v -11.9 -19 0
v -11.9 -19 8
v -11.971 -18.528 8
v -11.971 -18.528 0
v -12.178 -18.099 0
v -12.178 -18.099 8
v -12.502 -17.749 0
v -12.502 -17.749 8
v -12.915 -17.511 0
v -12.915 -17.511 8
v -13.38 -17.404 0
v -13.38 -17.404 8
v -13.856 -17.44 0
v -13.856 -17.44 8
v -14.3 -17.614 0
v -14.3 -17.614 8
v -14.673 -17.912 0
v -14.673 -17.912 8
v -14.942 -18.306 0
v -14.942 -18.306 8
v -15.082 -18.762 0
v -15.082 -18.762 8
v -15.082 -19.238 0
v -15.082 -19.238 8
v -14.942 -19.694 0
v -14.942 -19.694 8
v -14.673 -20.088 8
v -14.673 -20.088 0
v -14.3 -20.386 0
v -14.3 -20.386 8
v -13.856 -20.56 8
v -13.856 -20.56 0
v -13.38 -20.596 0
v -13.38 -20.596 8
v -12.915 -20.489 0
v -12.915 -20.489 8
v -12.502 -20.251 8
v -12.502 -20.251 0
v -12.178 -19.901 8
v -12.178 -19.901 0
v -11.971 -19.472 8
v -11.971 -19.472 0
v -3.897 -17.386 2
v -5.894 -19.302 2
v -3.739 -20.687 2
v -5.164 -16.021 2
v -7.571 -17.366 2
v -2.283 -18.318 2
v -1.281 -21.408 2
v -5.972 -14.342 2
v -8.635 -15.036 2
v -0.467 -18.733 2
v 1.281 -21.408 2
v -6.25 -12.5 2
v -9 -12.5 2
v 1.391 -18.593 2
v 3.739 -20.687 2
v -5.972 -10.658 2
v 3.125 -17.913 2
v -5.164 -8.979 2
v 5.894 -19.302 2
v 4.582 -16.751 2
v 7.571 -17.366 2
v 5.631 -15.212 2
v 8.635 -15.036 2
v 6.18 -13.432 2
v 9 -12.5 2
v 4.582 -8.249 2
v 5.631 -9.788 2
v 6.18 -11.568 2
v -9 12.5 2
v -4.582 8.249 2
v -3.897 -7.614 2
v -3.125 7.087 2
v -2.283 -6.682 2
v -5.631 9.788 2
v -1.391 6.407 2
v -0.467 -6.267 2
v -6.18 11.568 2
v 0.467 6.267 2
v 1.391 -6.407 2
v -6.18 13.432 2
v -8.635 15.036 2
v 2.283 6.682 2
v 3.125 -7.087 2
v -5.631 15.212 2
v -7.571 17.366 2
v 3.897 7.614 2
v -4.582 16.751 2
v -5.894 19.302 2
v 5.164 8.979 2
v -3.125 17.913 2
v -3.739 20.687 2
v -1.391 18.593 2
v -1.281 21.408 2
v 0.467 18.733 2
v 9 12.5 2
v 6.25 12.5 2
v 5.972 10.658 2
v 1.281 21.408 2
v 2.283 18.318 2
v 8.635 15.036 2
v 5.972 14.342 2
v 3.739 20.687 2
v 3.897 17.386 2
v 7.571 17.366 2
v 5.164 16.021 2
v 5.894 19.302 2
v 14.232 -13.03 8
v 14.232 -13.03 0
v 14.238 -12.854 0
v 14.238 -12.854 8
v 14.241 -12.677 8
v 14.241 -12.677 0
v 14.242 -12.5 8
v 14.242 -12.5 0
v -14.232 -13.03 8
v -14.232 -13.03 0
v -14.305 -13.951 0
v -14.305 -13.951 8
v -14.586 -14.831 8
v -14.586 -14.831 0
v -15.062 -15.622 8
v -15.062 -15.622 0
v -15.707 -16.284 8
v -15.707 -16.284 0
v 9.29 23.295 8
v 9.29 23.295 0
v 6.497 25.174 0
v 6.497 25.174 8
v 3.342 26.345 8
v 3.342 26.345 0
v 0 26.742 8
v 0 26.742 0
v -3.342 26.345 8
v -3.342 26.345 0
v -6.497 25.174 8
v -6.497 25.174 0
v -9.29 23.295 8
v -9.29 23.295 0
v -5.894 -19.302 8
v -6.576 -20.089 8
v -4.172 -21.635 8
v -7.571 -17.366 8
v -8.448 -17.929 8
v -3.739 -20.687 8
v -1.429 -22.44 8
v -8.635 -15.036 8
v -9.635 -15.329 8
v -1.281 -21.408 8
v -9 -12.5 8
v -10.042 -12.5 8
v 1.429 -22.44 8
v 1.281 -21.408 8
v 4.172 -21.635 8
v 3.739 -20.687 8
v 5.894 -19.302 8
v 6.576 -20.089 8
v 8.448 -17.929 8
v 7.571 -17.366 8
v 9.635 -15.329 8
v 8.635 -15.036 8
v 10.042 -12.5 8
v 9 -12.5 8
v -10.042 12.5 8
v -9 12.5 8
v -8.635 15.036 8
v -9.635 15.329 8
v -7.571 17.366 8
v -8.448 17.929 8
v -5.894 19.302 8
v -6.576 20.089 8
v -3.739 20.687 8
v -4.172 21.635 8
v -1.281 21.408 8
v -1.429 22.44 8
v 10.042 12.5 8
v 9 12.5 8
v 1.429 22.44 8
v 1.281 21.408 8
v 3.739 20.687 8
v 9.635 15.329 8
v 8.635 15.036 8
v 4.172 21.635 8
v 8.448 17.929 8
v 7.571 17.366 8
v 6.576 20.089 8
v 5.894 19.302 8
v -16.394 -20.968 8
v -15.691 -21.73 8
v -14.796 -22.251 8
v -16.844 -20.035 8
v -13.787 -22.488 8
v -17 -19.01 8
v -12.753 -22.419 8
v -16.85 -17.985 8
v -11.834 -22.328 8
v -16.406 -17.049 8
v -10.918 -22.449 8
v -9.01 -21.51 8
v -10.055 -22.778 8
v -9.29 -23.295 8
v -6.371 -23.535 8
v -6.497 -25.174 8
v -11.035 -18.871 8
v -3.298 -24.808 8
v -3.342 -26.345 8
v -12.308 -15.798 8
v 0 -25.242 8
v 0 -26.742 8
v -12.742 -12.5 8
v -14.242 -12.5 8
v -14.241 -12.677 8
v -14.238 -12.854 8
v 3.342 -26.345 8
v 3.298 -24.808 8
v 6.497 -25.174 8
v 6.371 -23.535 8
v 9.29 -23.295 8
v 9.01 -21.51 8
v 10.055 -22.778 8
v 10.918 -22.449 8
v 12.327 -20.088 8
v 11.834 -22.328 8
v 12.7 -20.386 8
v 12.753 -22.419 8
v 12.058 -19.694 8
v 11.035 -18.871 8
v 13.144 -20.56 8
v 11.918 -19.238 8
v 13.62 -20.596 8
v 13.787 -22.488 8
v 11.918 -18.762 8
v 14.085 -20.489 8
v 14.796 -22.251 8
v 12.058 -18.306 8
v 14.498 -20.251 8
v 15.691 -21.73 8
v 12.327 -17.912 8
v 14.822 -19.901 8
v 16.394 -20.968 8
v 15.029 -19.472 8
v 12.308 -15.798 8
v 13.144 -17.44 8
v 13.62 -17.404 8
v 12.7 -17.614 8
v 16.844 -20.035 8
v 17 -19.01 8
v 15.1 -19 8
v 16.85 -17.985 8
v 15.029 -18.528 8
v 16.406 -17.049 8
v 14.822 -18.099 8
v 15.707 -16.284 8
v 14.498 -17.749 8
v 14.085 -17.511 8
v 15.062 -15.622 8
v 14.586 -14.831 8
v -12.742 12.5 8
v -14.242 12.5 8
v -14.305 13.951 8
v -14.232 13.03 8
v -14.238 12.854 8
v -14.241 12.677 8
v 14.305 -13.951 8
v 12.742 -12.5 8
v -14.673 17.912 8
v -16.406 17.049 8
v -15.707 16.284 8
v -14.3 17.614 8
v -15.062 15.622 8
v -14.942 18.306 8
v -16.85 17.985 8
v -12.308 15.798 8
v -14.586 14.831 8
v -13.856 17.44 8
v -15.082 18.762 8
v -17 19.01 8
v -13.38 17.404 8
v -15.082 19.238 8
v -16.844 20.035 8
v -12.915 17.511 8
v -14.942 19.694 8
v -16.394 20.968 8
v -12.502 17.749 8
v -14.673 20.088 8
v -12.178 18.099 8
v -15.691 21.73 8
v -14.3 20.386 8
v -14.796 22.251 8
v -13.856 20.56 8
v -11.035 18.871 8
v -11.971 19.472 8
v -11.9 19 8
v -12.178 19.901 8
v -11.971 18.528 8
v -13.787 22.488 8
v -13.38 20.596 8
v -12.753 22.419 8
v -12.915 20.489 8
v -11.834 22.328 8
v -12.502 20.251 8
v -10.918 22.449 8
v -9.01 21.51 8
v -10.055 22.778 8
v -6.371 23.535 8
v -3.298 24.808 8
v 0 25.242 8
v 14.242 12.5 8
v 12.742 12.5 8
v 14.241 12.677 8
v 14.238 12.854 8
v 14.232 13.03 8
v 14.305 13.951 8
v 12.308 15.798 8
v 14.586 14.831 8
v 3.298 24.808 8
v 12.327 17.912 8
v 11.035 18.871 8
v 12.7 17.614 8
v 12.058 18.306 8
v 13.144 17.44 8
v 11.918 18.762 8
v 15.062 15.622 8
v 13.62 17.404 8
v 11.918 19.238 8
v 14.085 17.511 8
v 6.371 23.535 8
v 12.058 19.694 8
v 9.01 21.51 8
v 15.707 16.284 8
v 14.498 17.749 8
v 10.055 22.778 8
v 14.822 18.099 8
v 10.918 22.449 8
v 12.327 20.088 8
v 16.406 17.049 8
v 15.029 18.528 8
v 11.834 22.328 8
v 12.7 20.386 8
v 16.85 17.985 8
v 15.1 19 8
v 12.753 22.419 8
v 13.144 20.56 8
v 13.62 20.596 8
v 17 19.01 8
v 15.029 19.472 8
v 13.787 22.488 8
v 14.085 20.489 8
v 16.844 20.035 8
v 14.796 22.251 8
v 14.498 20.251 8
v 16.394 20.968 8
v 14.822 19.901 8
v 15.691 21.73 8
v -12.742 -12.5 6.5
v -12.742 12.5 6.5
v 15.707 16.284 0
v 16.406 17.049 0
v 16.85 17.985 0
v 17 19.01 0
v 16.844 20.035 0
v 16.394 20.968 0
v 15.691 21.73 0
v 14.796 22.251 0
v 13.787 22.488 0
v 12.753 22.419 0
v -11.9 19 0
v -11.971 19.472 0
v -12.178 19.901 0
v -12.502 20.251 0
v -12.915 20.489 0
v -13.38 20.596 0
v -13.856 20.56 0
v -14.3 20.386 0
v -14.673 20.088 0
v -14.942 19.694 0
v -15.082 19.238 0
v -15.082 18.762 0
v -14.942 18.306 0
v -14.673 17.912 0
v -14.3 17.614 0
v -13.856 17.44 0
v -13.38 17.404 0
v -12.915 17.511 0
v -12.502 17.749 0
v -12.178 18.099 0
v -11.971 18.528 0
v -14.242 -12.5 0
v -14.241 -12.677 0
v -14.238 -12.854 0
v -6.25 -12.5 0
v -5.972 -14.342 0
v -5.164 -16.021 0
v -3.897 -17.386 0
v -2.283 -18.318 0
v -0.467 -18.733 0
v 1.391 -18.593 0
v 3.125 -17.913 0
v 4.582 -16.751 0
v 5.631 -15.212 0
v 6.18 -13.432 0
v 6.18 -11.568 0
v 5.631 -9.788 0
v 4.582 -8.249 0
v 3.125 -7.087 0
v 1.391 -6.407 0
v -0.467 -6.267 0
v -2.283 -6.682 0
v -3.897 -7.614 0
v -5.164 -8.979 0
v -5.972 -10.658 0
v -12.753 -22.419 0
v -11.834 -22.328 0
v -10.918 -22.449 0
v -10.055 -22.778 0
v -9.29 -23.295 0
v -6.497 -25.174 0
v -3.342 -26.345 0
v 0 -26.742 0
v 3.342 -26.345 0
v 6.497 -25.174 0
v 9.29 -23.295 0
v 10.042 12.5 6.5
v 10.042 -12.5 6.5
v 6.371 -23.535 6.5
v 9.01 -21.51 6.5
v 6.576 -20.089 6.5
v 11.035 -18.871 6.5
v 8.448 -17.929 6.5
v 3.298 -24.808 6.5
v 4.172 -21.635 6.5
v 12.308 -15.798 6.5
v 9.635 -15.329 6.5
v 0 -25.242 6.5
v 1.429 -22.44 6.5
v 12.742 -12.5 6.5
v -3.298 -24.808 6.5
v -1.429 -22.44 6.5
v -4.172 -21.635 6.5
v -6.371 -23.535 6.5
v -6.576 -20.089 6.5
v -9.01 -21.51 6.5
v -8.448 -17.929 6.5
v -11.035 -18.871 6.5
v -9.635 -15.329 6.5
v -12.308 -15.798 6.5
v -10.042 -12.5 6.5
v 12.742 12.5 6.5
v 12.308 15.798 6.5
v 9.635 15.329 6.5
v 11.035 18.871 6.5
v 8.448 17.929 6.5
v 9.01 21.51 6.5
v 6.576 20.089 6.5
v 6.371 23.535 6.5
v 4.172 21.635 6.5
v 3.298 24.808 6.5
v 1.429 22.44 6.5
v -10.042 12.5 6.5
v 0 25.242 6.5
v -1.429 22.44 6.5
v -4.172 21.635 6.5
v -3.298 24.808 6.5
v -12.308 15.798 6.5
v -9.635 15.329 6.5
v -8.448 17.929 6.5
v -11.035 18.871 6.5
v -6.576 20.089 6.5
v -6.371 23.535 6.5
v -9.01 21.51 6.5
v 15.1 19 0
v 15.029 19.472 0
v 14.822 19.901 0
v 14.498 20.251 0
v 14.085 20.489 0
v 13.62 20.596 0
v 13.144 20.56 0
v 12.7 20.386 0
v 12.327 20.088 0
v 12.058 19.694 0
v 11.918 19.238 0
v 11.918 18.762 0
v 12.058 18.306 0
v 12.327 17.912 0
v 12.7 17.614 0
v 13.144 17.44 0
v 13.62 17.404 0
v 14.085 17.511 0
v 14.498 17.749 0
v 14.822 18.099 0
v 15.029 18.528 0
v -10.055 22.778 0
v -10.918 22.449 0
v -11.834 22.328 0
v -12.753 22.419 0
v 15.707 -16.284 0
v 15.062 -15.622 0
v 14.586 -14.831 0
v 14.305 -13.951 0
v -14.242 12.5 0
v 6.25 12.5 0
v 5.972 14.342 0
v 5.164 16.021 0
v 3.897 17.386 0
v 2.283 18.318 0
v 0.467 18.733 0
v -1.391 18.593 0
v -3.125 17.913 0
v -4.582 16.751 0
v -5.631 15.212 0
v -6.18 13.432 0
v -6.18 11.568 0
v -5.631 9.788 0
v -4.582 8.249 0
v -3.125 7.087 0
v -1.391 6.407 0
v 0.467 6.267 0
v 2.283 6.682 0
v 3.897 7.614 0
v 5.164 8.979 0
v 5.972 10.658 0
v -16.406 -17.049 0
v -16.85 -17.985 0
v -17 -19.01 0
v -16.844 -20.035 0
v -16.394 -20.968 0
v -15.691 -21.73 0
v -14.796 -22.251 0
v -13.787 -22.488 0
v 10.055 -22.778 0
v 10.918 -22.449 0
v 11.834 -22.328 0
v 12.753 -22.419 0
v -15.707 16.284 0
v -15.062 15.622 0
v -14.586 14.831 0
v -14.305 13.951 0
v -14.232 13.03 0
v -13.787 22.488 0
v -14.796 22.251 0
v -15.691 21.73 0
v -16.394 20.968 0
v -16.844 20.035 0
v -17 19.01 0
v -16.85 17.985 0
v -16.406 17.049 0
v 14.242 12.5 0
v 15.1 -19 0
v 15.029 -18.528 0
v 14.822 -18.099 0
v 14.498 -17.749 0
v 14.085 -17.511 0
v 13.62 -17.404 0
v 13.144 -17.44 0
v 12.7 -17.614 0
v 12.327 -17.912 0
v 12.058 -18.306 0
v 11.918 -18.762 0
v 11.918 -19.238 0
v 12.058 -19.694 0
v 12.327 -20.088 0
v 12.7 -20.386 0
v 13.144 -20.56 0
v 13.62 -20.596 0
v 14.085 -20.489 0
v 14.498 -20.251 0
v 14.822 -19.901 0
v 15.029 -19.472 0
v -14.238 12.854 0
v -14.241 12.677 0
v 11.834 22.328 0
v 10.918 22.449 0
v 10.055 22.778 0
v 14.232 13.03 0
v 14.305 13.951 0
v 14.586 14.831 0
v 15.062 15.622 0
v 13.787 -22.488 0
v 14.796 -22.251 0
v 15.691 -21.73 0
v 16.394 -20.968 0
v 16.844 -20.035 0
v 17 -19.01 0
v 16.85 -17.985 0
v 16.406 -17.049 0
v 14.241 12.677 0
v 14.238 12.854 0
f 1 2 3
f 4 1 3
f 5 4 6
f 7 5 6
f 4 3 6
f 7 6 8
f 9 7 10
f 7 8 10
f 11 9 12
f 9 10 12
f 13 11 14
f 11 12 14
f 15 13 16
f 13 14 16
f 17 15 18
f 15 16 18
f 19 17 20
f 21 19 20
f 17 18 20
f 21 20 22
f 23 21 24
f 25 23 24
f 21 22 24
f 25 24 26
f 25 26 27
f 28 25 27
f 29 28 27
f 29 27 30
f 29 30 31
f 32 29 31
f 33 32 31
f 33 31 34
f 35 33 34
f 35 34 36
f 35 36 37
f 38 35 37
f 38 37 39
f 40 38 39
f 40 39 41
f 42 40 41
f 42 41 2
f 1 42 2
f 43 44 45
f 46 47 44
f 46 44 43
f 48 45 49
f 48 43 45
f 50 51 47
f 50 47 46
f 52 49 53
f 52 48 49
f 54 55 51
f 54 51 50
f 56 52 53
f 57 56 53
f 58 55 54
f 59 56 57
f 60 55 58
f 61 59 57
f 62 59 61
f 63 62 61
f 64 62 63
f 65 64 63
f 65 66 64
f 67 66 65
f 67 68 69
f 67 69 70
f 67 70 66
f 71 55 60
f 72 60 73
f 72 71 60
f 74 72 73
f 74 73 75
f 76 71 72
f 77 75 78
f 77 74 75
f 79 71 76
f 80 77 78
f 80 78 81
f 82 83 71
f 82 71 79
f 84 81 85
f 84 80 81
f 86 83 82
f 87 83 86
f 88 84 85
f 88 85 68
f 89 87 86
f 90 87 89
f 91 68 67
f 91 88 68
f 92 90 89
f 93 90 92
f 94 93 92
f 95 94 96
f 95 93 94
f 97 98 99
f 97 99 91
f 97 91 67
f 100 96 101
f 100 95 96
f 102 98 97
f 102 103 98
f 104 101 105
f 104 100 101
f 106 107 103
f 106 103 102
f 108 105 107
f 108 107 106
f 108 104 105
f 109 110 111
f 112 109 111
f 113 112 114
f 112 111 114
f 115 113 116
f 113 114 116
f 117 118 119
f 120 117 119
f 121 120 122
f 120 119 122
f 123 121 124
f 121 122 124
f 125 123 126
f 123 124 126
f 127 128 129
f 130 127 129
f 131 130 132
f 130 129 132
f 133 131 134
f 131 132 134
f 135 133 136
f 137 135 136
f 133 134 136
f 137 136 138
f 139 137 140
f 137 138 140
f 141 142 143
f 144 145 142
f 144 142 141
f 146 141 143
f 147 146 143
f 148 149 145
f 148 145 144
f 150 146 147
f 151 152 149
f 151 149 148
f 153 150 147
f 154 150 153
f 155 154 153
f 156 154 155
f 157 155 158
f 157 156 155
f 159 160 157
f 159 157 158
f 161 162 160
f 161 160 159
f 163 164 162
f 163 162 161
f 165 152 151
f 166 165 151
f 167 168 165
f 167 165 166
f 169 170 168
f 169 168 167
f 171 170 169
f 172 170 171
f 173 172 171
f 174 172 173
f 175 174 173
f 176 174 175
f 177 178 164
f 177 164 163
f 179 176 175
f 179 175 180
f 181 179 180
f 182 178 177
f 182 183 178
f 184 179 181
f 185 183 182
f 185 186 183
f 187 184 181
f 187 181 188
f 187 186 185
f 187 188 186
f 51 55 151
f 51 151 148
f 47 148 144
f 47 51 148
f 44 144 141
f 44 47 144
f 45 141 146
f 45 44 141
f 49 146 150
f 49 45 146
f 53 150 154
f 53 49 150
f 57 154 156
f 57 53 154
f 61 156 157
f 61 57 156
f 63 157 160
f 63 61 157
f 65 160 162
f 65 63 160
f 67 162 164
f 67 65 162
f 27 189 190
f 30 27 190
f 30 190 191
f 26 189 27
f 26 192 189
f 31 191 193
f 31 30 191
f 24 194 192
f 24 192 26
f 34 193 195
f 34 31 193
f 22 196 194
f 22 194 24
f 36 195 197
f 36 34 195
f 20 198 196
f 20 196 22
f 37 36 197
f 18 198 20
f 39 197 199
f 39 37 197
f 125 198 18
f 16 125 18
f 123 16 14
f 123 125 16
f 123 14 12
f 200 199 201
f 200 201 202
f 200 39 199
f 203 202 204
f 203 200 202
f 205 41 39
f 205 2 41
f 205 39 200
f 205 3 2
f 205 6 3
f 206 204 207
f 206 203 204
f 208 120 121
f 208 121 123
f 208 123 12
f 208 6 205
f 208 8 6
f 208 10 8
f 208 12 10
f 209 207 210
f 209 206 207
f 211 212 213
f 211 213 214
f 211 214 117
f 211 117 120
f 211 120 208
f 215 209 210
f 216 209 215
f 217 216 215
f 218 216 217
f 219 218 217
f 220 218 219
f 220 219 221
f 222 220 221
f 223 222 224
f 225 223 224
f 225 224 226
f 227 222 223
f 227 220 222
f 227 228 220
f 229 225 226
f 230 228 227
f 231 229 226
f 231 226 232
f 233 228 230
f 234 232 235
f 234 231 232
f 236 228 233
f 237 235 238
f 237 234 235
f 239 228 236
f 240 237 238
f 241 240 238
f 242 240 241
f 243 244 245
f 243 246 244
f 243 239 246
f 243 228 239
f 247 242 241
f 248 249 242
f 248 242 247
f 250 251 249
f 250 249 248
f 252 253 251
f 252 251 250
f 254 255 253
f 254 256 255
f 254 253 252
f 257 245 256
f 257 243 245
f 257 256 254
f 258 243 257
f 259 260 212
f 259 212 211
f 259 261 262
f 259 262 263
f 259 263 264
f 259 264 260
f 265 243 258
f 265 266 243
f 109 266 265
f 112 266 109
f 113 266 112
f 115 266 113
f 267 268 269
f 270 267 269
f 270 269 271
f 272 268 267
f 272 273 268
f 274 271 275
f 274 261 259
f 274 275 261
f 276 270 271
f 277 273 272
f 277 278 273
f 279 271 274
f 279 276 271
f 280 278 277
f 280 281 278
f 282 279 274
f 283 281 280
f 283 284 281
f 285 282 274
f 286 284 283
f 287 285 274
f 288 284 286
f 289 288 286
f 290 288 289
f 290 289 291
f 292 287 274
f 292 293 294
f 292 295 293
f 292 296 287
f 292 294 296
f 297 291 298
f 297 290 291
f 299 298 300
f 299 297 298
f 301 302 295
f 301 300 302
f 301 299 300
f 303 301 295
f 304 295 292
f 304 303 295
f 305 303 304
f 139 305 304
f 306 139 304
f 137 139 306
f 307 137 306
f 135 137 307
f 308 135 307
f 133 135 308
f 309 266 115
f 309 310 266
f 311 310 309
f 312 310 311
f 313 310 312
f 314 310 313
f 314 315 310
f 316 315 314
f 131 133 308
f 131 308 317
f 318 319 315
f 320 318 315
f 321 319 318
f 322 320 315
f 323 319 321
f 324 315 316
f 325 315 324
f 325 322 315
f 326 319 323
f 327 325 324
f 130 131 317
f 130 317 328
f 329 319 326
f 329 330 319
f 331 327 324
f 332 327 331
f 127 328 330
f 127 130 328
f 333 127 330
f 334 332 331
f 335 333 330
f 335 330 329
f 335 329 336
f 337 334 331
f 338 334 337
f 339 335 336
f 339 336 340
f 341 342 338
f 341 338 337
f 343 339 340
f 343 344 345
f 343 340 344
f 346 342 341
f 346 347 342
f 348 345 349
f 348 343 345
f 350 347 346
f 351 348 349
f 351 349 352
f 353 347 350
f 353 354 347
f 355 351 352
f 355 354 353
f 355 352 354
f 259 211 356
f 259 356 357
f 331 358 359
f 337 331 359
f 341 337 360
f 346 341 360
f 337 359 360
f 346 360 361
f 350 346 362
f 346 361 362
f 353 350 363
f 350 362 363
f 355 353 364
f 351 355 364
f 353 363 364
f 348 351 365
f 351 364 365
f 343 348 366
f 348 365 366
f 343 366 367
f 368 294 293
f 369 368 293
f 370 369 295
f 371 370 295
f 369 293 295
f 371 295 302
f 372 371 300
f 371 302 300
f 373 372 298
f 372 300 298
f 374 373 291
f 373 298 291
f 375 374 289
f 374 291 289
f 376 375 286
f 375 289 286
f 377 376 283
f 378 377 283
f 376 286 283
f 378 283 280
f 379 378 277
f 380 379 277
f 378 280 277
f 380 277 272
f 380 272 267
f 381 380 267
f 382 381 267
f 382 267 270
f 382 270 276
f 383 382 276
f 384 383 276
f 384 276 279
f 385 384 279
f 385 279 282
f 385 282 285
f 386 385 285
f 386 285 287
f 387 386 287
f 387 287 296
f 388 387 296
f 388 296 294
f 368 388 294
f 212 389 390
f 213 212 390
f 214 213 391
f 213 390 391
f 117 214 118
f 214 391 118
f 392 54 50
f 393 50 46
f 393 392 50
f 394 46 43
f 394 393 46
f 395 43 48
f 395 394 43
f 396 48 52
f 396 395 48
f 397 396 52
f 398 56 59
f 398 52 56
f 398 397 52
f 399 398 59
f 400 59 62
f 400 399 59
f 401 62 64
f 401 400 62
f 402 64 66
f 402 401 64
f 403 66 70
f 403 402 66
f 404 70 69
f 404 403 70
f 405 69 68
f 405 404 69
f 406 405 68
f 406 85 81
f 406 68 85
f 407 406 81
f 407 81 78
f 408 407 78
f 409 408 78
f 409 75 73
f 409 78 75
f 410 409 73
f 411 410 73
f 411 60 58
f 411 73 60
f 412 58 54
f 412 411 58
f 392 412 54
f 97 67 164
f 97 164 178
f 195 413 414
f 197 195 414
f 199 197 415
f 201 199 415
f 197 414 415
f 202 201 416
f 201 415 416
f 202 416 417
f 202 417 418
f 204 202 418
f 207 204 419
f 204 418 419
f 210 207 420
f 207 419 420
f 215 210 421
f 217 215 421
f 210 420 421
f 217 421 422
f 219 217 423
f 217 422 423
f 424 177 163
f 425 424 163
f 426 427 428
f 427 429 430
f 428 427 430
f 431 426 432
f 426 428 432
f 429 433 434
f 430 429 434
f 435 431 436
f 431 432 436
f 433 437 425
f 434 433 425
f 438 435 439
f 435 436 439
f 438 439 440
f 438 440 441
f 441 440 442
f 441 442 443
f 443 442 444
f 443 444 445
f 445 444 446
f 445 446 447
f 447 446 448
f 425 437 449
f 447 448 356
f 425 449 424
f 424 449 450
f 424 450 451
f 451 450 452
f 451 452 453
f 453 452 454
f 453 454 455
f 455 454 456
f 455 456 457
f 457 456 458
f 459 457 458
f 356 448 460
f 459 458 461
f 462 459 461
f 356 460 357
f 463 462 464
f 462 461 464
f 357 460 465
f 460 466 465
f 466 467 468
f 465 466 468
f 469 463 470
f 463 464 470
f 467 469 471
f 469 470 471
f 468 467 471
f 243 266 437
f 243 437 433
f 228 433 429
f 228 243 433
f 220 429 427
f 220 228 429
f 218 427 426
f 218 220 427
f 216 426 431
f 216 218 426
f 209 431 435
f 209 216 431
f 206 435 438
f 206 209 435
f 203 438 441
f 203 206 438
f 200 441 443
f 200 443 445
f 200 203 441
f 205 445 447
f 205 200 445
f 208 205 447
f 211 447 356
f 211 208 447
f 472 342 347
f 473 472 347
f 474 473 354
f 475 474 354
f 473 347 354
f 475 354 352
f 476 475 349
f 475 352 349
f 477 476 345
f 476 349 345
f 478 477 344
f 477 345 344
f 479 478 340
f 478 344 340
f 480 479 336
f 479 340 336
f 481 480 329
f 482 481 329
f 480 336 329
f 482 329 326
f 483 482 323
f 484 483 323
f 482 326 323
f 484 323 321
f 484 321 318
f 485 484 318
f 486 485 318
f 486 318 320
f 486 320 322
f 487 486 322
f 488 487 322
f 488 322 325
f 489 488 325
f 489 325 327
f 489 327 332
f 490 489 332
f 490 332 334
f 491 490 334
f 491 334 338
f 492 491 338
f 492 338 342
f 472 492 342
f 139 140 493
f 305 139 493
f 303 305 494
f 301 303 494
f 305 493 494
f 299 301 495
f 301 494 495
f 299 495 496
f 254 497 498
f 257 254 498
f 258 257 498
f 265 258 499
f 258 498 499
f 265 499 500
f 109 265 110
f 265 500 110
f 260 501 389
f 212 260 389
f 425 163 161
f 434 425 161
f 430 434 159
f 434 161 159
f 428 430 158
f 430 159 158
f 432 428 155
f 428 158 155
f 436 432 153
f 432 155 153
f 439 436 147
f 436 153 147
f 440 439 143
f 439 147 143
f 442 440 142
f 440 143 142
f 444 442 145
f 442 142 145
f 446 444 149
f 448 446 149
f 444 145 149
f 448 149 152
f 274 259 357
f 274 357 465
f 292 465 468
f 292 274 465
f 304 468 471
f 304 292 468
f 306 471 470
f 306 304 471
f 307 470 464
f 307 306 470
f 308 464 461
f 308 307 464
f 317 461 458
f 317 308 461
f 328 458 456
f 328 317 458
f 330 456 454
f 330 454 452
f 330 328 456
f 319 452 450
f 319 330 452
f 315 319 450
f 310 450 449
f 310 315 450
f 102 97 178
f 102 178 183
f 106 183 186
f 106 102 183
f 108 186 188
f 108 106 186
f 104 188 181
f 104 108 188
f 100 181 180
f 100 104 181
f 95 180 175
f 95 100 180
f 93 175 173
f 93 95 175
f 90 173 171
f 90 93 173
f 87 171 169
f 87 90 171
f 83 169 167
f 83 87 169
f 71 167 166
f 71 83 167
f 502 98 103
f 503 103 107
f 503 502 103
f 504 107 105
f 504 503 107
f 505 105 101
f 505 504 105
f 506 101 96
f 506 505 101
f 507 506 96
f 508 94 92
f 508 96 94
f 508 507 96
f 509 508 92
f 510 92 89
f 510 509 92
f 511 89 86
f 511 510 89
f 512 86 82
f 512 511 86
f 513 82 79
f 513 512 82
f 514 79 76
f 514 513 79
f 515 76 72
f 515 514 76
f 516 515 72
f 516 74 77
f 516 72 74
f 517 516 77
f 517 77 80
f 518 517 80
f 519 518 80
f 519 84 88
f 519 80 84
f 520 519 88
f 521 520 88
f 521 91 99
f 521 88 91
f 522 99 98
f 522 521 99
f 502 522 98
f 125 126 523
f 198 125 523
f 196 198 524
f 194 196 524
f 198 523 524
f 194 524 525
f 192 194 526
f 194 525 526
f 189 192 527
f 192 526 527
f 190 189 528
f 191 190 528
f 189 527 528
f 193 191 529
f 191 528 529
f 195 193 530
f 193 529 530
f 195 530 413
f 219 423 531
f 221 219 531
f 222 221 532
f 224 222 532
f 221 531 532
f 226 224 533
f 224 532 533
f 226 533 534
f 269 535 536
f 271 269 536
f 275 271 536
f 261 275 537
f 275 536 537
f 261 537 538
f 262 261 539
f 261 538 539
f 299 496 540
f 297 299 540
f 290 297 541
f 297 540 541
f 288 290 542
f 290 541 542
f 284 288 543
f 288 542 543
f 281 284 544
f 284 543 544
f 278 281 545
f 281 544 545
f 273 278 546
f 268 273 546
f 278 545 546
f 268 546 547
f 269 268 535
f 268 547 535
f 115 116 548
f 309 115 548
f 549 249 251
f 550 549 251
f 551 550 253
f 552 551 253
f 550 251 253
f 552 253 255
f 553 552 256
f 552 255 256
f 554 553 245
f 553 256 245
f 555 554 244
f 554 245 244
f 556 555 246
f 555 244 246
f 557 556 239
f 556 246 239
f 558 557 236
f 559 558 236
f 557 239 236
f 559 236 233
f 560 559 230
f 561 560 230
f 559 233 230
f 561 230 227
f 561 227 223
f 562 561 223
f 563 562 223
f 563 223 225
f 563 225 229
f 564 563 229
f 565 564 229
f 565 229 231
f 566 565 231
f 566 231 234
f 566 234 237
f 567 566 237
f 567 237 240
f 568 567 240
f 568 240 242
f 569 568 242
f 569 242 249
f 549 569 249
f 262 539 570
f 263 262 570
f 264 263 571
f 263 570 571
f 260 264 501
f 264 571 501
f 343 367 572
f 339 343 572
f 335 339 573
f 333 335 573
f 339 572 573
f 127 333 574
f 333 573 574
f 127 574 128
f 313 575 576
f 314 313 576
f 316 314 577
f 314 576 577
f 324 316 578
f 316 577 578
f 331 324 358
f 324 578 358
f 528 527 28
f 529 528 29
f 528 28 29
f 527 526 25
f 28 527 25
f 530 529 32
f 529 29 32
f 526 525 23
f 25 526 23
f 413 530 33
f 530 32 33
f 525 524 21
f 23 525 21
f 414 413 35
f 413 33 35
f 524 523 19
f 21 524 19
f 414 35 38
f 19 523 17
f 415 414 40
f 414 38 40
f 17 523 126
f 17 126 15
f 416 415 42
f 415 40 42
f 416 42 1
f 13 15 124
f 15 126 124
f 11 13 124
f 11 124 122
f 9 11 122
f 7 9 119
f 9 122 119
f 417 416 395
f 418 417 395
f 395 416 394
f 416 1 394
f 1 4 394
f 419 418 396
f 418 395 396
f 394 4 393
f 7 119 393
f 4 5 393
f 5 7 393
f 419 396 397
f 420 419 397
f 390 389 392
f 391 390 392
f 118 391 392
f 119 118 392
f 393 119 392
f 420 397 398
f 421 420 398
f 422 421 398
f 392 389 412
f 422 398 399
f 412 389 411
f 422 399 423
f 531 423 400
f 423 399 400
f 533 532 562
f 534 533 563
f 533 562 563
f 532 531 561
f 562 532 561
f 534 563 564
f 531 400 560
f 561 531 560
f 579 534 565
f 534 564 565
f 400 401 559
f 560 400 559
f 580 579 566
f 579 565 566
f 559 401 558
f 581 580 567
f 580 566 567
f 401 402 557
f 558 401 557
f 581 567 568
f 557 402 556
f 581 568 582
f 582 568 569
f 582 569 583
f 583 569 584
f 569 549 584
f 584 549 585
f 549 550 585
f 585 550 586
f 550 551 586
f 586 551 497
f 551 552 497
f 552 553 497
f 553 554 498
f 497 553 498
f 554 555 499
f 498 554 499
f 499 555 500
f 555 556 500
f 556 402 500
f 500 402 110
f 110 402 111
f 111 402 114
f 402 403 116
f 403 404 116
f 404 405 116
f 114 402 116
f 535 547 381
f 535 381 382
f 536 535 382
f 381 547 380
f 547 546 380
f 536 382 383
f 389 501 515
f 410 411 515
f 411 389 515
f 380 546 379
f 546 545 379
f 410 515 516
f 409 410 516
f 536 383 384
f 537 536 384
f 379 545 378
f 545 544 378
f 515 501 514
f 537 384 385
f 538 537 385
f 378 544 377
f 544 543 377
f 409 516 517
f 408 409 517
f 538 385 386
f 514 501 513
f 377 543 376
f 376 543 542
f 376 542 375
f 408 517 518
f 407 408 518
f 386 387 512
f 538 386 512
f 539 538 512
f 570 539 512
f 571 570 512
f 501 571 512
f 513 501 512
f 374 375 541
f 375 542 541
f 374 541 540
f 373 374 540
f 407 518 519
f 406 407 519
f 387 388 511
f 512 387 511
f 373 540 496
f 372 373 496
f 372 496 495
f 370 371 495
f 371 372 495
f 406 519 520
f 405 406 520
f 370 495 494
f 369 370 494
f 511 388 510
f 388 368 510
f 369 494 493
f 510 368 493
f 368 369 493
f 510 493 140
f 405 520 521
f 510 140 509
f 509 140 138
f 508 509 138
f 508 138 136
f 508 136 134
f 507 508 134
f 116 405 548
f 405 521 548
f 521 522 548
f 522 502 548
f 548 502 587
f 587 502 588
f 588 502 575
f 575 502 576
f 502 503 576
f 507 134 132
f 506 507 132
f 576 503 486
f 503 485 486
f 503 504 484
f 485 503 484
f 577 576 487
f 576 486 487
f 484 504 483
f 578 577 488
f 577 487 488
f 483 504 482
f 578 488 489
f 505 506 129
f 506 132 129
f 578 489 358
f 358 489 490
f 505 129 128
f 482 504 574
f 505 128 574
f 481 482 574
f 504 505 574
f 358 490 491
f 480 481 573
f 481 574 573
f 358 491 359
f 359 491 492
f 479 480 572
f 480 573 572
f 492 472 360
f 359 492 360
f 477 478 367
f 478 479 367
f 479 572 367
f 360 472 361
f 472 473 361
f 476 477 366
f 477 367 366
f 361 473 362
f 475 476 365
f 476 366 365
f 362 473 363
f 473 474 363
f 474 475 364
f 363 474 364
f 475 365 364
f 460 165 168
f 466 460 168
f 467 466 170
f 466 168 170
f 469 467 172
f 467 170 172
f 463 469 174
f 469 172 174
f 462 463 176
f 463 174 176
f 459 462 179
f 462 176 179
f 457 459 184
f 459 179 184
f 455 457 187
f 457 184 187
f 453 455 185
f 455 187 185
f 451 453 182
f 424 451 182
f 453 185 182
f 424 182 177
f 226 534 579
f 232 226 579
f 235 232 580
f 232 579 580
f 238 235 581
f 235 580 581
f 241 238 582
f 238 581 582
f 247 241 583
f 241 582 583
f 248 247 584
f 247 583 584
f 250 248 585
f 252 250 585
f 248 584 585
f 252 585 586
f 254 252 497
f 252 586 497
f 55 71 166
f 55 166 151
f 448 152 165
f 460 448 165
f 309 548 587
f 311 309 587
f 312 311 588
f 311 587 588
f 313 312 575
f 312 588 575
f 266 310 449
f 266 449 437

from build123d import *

# Parameters (mm, degrees)
SKETCH_1_R          = 6.25
EXTRUDE_1_DEPTH     = 8
CUT_EXTRUDE_START   = 2
CUT_EXTRUDE_1_DEPTH = 31.682534896
CUT_EXTRUDE_START_2 = 8
CUT_EXTRUDE_4_DEPTH = 1.5
HOLE_WIZARD_M3_2_D  = 3.2


with BuildPart() as part:
    # ｽｹｯﾁ1 → ﾎﾞｽ - 押し出し1 (new body)
    with BuildSketch(Plane.XY):
        with BuildLine():
            Line((-14.242252845, 12.5), (-14.242252845, -12.5))
            ThreePointArc((-14.242252845, -12.5), (-14.23978335, -12.765209825), (-14.232375721, -13.030327679))
            ThreePointArc((-14.232375721, -13.030327679), (-14.58644356, -14.830756402), (-15.707147454, -16.28366053))
            ThreePointArc((-15.707147454, -16.28366053), (-16.653505844, -20.518354666), (-12.752931254, -22.419340329))
            ThreePointArc((-12.752931254, -22.419340329), (-10.918262125, -22.449287076), (-9.290000484, -23.295260864))
            ThreePointArc((-9.290000484, -23.295260864), (0, -26.742252845), (9.290000484, -23.295260864))
            ThreePointArc((9.290000484, -23.295260864), (10.918262125, -22.449287076), (12.752931254, -22.419340329))
            ThreePointArc((12.752931254, -22.419340329), (16.653505844, -20.518354666), (15.707147454, -16.28366053))
            ThreePointArc((15.707147454, -16.28366053), (14.58644356, -14.830756402), (14.232375721, -13.030327679))
            ThreePointArc((14.232375721, -13.030327679), (14.23978335, -12.765209825), (14.242252845, -12.5))
            Line((14.242252845, -12.5), (14.242252845, 12.5))
            ThreePointArc((14.242252845, 12.5), (14.23978335, 12.765209825), (14.232375721, 13.030327679))
            ThreePointArc((14.232375721, 13.030327679), (14.58644356, 14.830756402), (15.707147454, 16.28366053))
            ThreePointArc((15.707147454, 16.28366053), (16.653505844, 20.518354666), (12.752931254, 22.419340329))
            ThreePointArc((12.752931254, 22.419340329), (10.918262125, 22.449287076), (9.290000484, 23.295260864))
            ThreePointArc((9.290000484, 23.295260864), (0, 26.742252845), (-9.290000484, 23.295260864))
            ThreePointArc((-9.290000484, 23.295260864), (-10.918262125, 22.449287076), (-12.752931254, 22.419340329))
            ThreePointArc((-12.752931254, 22.419340329), (-16.653505844, 20.518354666), (-15.707147454, 16.28366053))
            ThreePointArc((-15.707147454, 16.28366053), (-14.58644356, 14.830756402), (-14.232375721, 13.030327679))
            ThreePointArc((-14.232375721, 13.030327679), (-14.23978335, 12.765209825), (-14.242252845, 12.5))
        make_face()
        with Locations((0, 12.5)):
            Circle(SKETCH_1_R, mode=Mode.SUBTRACT)
        with Locations(Location((0, -12.5, 0), (0, 0, 180))):
            Circle(SKETCH_1_R, mode=Mode.SUBTRACT)
    extrude(amount=EXTRUDE_1_DEPTH)

    # ｽｹｯﾁ1<3> → ｶｯﾄ - 押し出し1 (cut, through all)
    with BuildSketch(Plane.XY.offset(CUT_EXTRUDE_START)):
        with BuildLine():
            Line((-9, 12.5), (-9, -12.5))
            ThreePointArc((-9, -12.5), (0, -21.5), (9, -12.5))
            Line((9, -12.5), (9, 12.5))
            ThreePointArc((9, 12.5), (0, 21.5), (-9, 12.5))
        make_face()
    extrude(amount=CUT_EXTRUDE_1_DEPTH, mode=Mode.SUBTRACT)

    # ｽｹｯﾁ1<6> → ｶｯﾄ - 押し出し4 (cut)
    with BuildSketch(Plane.XY.offset(CUT_EXTRUDE_START_2)):
        with BuildLine():
            ThreePointArc((12.742252845, -12.5), (0, -25.242252845), (-12.742252845, -12.5))
            Line((-12.742252845, -12.5), (-12.742252845, 12.5))
            ThreePointArc((-12.742252845, 12.5), (0, 25.242252845), (12.742252845, 12.5))
            Line((12.742252845, 12.5), (12.742252845, -12.5))
        make_face()
        with BuildLine():
            Line((10.042252845, 12.5), (10.042252845, -12.5))
            ThreePointArc((10.042252845, -12.5), (0, -22.542252845), (-10.042252845, -12.5))
            Line((-10.042252845, -12.5), (-10.042252845, 12.5))
            ThreePointArc((-10.042252845, 12.5), (0, 22.542252845), (10.042252845, 12.5))
        make_face(mode=Mode.SUBTRACT)
    extrude(amount=-CUT_EXTRUDE_4_DEPTH, mode=Mode.SUBTRACT)

    # M3 すきま穴2 (through all)
    with Locations(Plane(origin=(-13.5, 19, 0), x_dir=(-1, 0, 0), z_dir=(0, 0, -1))):
        with Locations((0, 0), (0, -38), (-27, -38), (-27, 0)):
            Hole(HOLE_WIZARD_M3_2_D / 2)


solid = part.part
